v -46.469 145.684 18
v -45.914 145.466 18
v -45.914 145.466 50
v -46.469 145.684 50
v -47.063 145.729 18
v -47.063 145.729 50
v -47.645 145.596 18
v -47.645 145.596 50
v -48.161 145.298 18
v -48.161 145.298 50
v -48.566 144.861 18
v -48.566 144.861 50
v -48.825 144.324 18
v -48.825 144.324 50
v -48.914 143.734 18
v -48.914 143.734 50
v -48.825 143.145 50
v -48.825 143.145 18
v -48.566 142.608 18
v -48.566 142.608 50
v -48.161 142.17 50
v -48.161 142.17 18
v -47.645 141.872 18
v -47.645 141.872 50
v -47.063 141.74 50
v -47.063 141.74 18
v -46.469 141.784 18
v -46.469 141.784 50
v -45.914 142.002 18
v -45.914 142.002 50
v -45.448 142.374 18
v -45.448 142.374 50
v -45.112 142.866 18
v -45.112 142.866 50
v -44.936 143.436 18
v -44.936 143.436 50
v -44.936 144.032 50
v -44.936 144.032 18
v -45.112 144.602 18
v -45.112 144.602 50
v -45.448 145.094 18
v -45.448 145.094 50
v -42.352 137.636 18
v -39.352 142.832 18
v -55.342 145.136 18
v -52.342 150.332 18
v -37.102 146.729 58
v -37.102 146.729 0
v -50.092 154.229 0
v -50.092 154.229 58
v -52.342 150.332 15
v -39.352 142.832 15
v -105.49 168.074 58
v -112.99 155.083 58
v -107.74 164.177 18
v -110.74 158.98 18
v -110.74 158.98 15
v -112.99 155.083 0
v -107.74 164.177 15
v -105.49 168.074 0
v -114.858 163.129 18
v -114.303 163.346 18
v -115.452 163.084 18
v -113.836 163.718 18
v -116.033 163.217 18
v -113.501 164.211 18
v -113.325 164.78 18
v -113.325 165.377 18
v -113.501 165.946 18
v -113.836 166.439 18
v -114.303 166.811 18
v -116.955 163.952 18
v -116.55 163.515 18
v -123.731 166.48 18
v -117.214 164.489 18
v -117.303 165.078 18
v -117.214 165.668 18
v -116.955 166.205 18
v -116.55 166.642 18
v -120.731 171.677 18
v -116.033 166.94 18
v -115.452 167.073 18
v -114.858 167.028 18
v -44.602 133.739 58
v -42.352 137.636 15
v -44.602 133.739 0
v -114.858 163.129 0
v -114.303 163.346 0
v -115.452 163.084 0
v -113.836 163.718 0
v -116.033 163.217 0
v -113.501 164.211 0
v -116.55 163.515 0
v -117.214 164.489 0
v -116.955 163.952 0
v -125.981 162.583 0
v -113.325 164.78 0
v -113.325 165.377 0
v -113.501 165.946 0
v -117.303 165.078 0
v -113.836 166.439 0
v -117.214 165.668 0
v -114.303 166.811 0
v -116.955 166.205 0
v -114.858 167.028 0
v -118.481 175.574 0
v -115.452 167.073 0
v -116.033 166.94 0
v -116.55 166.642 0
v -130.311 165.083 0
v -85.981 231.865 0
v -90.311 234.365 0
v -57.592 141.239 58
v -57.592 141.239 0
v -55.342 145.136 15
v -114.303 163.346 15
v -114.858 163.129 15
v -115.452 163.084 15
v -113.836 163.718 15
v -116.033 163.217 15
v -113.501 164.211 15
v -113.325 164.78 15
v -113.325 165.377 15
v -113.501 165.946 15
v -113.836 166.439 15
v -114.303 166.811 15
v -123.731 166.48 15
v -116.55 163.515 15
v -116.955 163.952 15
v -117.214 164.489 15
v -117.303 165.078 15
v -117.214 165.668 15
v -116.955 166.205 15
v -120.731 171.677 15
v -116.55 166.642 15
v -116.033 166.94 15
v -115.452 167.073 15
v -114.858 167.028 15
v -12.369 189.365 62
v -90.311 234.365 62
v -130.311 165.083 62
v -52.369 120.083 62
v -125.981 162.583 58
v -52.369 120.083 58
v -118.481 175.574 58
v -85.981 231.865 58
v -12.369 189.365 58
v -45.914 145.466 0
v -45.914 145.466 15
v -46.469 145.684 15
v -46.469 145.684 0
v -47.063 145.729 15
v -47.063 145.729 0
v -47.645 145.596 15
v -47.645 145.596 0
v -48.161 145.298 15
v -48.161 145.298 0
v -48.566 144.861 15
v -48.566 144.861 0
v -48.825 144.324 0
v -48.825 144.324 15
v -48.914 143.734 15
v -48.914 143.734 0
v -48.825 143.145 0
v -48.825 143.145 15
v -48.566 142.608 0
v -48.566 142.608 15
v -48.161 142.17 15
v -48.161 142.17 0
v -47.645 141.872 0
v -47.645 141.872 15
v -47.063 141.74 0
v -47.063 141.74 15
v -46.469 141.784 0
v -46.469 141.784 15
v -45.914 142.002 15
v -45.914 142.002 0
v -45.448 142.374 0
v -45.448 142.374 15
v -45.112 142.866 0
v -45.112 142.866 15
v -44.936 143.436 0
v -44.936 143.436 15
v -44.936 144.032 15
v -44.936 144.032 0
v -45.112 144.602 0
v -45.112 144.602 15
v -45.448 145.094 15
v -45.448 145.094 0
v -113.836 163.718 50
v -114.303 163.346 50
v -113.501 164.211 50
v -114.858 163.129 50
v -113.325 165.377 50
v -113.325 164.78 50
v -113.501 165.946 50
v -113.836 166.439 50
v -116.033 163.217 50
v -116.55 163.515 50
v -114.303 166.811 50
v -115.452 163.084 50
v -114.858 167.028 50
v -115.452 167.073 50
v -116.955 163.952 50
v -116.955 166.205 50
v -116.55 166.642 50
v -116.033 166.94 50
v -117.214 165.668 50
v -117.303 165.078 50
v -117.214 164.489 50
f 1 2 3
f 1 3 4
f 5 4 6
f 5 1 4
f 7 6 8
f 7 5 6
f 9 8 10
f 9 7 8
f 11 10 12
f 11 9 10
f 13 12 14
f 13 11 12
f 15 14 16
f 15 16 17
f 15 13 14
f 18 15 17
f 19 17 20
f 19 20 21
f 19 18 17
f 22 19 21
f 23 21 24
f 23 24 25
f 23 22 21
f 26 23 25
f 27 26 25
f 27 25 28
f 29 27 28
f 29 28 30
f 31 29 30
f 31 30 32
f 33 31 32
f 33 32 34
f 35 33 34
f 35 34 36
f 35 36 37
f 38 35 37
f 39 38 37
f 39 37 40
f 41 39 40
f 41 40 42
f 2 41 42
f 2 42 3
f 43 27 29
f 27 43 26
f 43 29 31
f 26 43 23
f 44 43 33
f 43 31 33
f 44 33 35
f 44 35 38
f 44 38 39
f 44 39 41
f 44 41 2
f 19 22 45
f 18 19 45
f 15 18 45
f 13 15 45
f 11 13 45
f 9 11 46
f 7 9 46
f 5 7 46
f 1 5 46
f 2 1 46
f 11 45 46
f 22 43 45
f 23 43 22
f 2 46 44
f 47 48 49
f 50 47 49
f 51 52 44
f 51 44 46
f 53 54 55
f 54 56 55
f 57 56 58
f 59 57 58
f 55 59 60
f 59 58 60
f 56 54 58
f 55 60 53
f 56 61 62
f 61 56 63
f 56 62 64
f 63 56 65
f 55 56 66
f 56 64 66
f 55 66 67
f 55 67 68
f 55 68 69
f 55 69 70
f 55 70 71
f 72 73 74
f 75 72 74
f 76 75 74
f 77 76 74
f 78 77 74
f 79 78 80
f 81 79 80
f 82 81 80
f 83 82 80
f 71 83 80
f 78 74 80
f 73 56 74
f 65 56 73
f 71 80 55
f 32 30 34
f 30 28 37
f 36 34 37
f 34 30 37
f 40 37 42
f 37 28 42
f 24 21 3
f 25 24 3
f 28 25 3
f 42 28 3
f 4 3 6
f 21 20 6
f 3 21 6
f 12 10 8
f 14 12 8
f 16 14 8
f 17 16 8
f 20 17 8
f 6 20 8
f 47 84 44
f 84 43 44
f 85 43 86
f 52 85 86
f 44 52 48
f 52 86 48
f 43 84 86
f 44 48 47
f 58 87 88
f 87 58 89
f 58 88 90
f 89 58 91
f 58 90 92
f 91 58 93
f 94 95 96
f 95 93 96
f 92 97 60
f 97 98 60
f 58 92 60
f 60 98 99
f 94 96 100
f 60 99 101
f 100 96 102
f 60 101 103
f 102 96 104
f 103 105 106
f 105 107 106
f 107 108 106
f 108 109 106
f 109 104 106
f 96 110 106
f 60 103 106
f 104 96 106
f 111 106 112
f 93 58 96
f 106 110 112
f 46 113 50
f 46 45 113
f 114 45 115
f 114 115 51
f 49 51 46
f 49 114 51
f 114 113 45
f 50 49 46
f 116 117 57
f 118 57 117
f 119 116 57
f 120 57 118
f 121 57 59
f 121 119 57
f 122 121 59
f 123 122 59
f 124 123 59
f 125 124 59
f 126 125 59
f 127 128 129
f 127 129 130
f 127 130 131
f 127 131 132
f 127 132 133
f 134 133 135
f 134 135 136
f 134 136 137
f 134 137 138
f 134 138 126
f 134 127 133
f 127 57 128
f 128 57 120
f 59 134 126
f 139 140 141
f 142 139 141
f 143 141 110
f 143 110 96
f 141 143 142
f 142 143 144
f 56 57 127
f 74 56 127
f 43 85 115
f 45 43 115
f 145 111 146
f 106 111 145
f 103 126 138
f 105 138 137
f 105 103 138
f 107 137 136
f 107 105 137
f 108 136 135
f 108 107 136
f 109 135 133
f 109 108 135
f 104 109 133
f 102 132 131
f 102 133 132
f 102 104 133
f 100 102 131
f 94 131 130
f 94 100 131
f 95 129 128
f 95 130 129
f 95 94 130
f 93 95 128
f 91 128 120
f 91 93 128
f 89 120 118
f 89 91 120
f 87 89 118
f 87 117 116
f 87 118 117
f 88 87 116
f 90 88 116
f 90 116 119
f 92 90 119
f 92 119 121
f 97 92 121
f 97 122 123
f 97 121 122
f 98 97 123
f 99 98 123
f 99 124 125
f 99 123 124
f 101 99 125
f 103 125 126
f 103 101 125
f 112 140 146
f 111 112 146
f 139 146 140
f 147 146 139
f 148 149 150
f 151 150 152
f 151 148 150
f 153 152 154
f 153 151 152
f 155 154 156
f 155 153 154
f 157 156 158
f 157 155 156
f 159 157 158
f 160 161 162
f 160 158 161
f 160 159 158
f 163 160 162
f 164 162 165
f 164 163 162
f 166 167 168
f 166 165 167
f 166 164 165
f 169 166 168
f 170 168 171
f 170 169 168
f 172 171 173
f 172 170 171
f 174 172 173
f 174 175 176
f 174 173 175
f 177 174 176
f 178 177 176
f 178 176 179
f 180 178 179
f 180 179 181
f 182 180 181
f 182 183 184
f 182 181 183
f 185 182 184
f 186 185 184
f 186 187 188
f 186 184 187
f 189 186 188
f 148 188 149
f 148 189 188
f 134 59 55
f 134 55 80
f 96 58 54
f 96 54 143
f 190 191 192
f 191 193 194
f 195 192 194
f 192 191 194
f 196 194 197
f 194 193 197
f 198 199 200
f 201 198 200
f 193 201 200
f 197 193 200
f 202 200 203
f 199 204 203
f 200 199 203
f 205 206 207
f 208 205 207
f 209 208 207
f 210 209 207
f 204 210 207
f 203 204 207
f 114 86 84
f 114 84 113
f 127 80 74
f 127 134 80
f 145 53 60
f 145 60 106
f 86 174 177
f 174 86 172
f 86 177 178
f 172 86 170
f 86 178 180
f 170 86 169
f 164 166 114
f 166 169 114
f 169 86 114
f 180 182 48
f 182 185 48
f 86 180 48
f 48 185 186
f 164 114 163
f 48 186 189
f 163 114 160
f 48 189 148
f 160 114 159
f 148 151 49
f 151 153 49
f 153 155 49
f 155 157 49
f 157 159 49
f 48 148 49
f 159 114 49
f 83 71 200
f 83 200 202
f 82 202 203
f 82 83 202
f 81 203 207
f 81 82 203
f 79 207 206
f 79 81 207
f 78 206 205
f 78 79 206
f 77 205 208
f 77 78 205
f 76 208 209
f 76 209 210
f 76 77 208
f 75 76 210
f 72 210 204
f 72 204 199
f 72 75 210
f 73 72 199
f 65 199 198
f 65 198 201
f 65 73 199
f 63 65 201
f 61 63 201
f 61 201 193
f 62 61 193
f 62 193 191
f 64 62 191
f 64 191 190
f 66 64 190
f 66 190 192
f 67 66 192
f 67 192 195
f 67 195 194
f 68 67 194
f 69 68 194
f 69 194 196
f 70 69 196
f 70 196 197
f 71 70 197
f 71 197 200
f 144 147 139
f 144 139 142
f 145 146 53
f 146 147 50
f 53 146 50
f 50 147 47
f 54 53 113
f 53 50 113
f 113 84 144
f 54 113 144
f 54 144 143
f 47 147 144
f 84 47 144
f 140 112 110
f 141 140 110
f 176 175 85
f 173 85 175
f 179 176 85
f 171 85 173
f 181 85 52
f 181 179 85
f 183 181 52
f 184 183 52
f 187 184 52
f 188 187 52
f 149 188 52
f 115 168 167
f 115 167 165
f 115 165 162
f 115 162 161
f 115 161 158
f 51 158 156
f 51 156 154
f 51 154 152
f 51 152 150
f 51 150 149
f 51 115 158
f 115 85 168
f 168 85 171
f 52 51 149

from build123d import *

# Parameters (mm, degrees)
BOX035_W                  = 6
BOX035_H                  = 15
BOX035_DEPTH              = 3
CYLINDER018_R             = 2
CYLINDER018_DEPTH         = 50
BOX_W                     = 15
BOX_H                     = 15
BOX_DEPTH                 = 58
CUT051_PLACEMENT_ANGLE    = 60
CUT052_PLACEMENT_ANGLE    = 60
BOX044_W                  = 80
BOX044_H                  = 5
BOX044_DEPTH              = 58
BOX045_W                  = 80
BOX045_H                  = 90
BOX045_DEPTH              = 4
FUSION090_PLACEMENT_ANGLE = 120


with BuildPart() as nut_hole:
    # Box035 → Box035 (new body)
    with BuildSketch(Plane(origin=(-8.5, 5, 15), x_dir=(1, 0, 0), z_dir=(0, 0, 1))):
        with Locations((3, 7.5)):
            Rectangle(BOX035_W, BOX035_H)
    extrude(amount=BOX035_DEPTH)


with BuildPart() as cylinder:
    # Cylinder018 → Cylinder018 (new body)
    with BuildSketch(Plane(origin=(-5.5, 12, 0), x_dir=(1, 0, 0), z_dir=(0, 0, 1))):
        Circle(CYLINDER018_R)
    extrude(amount=CYLINDER018_DEPTH)


with BuildPart() as cut:
    # Box → Box (new body)
    with BuildSketch(Plane(origin=(-13, 5, 0), x_dir=(1, 0, 0), z_dir=(0, 0, 1))):
        with Locations((7.5, 7.5)):
            Rectangle(BOX_W, BOX_H)
    extrude(amount=BOX_DEPTH)

    # Cut: cut Cylinder
    add(cylinder.part, mode=Mode.SUBTRACT)


with BuildPart() as cut051:
    # Cut051 base: copy of Cut
    add(cut.part)

    # Cut051: cut Nut hole
    add(nut_hole.part, mode=Mode.SUBTRACT)


with BuildPart() as cut051_1:
    # Cut051 placement: moved
    add(cut051.part.moved(Location((-102.160254, 163.841633, 0))).rotate(Axis((-102.160254, 163.841633, 0), (0, 0, 1)), CUT051_PLACEMENT_ANGLE))


with BuildPart() as cut052:
    # Cut052 base: copy of Cut
    add(cut.part)

    # Cut052: cut Nut hole
    add(nut_hole.part, mode=Mode.SUBTRACT)


with BuildPart() as cut052_1:
    # Cut052 placement: moved
    add(cut052.part.moved(Location((-33.77171, 142.497283, 0))).rotate(Axis((-33.77171, 142.497283, 0), (0, 0, 1)), CUT052_PLACEMENT_ANGLE))


with BuildPart() as cube006:
    # Box044 → Box044 (new body)
    with BuildSketch(Plane(origin=(-35, 0, 0), x_dir=(1, 0, 0), z_dir=(0, 0, 1))):
        with Locations((40, 2.5)):
            Rectangle(BOX044_W, BOX044_H)
    extrude(amount=BOX044_DEPTH)


with BuildPart() as fusion092:
    # Box045 → Box045 (new body)
    with BuildSketch(Plane(origin=(-35, 0, 58), x_dir=(1, 0, 0), z_dir=(0, 0, 1))):
        with Locations((40, 45)):
            Rectangle(BOX045_W, BOX045_H)
    extrude(amount=BOX045_DEPTH)

    # Fusion090: union Cube006
    add(cube006.part)


with BuildPart() as fusion092_1:
    # Fusion090 placement: moved
    add(fusion092.part.moved(Location((-107.811, 204.054, 0))).rotate(Axis((-107.811, 204.054, 0), (0, 0, -1)), FUSION090_PLACEMENT_ANGLE))

    # Fusion092: union Cut051, Cut052
    add(cut051_1.part)
    add(cut052_1.part)


solid = fusion092_1.part
